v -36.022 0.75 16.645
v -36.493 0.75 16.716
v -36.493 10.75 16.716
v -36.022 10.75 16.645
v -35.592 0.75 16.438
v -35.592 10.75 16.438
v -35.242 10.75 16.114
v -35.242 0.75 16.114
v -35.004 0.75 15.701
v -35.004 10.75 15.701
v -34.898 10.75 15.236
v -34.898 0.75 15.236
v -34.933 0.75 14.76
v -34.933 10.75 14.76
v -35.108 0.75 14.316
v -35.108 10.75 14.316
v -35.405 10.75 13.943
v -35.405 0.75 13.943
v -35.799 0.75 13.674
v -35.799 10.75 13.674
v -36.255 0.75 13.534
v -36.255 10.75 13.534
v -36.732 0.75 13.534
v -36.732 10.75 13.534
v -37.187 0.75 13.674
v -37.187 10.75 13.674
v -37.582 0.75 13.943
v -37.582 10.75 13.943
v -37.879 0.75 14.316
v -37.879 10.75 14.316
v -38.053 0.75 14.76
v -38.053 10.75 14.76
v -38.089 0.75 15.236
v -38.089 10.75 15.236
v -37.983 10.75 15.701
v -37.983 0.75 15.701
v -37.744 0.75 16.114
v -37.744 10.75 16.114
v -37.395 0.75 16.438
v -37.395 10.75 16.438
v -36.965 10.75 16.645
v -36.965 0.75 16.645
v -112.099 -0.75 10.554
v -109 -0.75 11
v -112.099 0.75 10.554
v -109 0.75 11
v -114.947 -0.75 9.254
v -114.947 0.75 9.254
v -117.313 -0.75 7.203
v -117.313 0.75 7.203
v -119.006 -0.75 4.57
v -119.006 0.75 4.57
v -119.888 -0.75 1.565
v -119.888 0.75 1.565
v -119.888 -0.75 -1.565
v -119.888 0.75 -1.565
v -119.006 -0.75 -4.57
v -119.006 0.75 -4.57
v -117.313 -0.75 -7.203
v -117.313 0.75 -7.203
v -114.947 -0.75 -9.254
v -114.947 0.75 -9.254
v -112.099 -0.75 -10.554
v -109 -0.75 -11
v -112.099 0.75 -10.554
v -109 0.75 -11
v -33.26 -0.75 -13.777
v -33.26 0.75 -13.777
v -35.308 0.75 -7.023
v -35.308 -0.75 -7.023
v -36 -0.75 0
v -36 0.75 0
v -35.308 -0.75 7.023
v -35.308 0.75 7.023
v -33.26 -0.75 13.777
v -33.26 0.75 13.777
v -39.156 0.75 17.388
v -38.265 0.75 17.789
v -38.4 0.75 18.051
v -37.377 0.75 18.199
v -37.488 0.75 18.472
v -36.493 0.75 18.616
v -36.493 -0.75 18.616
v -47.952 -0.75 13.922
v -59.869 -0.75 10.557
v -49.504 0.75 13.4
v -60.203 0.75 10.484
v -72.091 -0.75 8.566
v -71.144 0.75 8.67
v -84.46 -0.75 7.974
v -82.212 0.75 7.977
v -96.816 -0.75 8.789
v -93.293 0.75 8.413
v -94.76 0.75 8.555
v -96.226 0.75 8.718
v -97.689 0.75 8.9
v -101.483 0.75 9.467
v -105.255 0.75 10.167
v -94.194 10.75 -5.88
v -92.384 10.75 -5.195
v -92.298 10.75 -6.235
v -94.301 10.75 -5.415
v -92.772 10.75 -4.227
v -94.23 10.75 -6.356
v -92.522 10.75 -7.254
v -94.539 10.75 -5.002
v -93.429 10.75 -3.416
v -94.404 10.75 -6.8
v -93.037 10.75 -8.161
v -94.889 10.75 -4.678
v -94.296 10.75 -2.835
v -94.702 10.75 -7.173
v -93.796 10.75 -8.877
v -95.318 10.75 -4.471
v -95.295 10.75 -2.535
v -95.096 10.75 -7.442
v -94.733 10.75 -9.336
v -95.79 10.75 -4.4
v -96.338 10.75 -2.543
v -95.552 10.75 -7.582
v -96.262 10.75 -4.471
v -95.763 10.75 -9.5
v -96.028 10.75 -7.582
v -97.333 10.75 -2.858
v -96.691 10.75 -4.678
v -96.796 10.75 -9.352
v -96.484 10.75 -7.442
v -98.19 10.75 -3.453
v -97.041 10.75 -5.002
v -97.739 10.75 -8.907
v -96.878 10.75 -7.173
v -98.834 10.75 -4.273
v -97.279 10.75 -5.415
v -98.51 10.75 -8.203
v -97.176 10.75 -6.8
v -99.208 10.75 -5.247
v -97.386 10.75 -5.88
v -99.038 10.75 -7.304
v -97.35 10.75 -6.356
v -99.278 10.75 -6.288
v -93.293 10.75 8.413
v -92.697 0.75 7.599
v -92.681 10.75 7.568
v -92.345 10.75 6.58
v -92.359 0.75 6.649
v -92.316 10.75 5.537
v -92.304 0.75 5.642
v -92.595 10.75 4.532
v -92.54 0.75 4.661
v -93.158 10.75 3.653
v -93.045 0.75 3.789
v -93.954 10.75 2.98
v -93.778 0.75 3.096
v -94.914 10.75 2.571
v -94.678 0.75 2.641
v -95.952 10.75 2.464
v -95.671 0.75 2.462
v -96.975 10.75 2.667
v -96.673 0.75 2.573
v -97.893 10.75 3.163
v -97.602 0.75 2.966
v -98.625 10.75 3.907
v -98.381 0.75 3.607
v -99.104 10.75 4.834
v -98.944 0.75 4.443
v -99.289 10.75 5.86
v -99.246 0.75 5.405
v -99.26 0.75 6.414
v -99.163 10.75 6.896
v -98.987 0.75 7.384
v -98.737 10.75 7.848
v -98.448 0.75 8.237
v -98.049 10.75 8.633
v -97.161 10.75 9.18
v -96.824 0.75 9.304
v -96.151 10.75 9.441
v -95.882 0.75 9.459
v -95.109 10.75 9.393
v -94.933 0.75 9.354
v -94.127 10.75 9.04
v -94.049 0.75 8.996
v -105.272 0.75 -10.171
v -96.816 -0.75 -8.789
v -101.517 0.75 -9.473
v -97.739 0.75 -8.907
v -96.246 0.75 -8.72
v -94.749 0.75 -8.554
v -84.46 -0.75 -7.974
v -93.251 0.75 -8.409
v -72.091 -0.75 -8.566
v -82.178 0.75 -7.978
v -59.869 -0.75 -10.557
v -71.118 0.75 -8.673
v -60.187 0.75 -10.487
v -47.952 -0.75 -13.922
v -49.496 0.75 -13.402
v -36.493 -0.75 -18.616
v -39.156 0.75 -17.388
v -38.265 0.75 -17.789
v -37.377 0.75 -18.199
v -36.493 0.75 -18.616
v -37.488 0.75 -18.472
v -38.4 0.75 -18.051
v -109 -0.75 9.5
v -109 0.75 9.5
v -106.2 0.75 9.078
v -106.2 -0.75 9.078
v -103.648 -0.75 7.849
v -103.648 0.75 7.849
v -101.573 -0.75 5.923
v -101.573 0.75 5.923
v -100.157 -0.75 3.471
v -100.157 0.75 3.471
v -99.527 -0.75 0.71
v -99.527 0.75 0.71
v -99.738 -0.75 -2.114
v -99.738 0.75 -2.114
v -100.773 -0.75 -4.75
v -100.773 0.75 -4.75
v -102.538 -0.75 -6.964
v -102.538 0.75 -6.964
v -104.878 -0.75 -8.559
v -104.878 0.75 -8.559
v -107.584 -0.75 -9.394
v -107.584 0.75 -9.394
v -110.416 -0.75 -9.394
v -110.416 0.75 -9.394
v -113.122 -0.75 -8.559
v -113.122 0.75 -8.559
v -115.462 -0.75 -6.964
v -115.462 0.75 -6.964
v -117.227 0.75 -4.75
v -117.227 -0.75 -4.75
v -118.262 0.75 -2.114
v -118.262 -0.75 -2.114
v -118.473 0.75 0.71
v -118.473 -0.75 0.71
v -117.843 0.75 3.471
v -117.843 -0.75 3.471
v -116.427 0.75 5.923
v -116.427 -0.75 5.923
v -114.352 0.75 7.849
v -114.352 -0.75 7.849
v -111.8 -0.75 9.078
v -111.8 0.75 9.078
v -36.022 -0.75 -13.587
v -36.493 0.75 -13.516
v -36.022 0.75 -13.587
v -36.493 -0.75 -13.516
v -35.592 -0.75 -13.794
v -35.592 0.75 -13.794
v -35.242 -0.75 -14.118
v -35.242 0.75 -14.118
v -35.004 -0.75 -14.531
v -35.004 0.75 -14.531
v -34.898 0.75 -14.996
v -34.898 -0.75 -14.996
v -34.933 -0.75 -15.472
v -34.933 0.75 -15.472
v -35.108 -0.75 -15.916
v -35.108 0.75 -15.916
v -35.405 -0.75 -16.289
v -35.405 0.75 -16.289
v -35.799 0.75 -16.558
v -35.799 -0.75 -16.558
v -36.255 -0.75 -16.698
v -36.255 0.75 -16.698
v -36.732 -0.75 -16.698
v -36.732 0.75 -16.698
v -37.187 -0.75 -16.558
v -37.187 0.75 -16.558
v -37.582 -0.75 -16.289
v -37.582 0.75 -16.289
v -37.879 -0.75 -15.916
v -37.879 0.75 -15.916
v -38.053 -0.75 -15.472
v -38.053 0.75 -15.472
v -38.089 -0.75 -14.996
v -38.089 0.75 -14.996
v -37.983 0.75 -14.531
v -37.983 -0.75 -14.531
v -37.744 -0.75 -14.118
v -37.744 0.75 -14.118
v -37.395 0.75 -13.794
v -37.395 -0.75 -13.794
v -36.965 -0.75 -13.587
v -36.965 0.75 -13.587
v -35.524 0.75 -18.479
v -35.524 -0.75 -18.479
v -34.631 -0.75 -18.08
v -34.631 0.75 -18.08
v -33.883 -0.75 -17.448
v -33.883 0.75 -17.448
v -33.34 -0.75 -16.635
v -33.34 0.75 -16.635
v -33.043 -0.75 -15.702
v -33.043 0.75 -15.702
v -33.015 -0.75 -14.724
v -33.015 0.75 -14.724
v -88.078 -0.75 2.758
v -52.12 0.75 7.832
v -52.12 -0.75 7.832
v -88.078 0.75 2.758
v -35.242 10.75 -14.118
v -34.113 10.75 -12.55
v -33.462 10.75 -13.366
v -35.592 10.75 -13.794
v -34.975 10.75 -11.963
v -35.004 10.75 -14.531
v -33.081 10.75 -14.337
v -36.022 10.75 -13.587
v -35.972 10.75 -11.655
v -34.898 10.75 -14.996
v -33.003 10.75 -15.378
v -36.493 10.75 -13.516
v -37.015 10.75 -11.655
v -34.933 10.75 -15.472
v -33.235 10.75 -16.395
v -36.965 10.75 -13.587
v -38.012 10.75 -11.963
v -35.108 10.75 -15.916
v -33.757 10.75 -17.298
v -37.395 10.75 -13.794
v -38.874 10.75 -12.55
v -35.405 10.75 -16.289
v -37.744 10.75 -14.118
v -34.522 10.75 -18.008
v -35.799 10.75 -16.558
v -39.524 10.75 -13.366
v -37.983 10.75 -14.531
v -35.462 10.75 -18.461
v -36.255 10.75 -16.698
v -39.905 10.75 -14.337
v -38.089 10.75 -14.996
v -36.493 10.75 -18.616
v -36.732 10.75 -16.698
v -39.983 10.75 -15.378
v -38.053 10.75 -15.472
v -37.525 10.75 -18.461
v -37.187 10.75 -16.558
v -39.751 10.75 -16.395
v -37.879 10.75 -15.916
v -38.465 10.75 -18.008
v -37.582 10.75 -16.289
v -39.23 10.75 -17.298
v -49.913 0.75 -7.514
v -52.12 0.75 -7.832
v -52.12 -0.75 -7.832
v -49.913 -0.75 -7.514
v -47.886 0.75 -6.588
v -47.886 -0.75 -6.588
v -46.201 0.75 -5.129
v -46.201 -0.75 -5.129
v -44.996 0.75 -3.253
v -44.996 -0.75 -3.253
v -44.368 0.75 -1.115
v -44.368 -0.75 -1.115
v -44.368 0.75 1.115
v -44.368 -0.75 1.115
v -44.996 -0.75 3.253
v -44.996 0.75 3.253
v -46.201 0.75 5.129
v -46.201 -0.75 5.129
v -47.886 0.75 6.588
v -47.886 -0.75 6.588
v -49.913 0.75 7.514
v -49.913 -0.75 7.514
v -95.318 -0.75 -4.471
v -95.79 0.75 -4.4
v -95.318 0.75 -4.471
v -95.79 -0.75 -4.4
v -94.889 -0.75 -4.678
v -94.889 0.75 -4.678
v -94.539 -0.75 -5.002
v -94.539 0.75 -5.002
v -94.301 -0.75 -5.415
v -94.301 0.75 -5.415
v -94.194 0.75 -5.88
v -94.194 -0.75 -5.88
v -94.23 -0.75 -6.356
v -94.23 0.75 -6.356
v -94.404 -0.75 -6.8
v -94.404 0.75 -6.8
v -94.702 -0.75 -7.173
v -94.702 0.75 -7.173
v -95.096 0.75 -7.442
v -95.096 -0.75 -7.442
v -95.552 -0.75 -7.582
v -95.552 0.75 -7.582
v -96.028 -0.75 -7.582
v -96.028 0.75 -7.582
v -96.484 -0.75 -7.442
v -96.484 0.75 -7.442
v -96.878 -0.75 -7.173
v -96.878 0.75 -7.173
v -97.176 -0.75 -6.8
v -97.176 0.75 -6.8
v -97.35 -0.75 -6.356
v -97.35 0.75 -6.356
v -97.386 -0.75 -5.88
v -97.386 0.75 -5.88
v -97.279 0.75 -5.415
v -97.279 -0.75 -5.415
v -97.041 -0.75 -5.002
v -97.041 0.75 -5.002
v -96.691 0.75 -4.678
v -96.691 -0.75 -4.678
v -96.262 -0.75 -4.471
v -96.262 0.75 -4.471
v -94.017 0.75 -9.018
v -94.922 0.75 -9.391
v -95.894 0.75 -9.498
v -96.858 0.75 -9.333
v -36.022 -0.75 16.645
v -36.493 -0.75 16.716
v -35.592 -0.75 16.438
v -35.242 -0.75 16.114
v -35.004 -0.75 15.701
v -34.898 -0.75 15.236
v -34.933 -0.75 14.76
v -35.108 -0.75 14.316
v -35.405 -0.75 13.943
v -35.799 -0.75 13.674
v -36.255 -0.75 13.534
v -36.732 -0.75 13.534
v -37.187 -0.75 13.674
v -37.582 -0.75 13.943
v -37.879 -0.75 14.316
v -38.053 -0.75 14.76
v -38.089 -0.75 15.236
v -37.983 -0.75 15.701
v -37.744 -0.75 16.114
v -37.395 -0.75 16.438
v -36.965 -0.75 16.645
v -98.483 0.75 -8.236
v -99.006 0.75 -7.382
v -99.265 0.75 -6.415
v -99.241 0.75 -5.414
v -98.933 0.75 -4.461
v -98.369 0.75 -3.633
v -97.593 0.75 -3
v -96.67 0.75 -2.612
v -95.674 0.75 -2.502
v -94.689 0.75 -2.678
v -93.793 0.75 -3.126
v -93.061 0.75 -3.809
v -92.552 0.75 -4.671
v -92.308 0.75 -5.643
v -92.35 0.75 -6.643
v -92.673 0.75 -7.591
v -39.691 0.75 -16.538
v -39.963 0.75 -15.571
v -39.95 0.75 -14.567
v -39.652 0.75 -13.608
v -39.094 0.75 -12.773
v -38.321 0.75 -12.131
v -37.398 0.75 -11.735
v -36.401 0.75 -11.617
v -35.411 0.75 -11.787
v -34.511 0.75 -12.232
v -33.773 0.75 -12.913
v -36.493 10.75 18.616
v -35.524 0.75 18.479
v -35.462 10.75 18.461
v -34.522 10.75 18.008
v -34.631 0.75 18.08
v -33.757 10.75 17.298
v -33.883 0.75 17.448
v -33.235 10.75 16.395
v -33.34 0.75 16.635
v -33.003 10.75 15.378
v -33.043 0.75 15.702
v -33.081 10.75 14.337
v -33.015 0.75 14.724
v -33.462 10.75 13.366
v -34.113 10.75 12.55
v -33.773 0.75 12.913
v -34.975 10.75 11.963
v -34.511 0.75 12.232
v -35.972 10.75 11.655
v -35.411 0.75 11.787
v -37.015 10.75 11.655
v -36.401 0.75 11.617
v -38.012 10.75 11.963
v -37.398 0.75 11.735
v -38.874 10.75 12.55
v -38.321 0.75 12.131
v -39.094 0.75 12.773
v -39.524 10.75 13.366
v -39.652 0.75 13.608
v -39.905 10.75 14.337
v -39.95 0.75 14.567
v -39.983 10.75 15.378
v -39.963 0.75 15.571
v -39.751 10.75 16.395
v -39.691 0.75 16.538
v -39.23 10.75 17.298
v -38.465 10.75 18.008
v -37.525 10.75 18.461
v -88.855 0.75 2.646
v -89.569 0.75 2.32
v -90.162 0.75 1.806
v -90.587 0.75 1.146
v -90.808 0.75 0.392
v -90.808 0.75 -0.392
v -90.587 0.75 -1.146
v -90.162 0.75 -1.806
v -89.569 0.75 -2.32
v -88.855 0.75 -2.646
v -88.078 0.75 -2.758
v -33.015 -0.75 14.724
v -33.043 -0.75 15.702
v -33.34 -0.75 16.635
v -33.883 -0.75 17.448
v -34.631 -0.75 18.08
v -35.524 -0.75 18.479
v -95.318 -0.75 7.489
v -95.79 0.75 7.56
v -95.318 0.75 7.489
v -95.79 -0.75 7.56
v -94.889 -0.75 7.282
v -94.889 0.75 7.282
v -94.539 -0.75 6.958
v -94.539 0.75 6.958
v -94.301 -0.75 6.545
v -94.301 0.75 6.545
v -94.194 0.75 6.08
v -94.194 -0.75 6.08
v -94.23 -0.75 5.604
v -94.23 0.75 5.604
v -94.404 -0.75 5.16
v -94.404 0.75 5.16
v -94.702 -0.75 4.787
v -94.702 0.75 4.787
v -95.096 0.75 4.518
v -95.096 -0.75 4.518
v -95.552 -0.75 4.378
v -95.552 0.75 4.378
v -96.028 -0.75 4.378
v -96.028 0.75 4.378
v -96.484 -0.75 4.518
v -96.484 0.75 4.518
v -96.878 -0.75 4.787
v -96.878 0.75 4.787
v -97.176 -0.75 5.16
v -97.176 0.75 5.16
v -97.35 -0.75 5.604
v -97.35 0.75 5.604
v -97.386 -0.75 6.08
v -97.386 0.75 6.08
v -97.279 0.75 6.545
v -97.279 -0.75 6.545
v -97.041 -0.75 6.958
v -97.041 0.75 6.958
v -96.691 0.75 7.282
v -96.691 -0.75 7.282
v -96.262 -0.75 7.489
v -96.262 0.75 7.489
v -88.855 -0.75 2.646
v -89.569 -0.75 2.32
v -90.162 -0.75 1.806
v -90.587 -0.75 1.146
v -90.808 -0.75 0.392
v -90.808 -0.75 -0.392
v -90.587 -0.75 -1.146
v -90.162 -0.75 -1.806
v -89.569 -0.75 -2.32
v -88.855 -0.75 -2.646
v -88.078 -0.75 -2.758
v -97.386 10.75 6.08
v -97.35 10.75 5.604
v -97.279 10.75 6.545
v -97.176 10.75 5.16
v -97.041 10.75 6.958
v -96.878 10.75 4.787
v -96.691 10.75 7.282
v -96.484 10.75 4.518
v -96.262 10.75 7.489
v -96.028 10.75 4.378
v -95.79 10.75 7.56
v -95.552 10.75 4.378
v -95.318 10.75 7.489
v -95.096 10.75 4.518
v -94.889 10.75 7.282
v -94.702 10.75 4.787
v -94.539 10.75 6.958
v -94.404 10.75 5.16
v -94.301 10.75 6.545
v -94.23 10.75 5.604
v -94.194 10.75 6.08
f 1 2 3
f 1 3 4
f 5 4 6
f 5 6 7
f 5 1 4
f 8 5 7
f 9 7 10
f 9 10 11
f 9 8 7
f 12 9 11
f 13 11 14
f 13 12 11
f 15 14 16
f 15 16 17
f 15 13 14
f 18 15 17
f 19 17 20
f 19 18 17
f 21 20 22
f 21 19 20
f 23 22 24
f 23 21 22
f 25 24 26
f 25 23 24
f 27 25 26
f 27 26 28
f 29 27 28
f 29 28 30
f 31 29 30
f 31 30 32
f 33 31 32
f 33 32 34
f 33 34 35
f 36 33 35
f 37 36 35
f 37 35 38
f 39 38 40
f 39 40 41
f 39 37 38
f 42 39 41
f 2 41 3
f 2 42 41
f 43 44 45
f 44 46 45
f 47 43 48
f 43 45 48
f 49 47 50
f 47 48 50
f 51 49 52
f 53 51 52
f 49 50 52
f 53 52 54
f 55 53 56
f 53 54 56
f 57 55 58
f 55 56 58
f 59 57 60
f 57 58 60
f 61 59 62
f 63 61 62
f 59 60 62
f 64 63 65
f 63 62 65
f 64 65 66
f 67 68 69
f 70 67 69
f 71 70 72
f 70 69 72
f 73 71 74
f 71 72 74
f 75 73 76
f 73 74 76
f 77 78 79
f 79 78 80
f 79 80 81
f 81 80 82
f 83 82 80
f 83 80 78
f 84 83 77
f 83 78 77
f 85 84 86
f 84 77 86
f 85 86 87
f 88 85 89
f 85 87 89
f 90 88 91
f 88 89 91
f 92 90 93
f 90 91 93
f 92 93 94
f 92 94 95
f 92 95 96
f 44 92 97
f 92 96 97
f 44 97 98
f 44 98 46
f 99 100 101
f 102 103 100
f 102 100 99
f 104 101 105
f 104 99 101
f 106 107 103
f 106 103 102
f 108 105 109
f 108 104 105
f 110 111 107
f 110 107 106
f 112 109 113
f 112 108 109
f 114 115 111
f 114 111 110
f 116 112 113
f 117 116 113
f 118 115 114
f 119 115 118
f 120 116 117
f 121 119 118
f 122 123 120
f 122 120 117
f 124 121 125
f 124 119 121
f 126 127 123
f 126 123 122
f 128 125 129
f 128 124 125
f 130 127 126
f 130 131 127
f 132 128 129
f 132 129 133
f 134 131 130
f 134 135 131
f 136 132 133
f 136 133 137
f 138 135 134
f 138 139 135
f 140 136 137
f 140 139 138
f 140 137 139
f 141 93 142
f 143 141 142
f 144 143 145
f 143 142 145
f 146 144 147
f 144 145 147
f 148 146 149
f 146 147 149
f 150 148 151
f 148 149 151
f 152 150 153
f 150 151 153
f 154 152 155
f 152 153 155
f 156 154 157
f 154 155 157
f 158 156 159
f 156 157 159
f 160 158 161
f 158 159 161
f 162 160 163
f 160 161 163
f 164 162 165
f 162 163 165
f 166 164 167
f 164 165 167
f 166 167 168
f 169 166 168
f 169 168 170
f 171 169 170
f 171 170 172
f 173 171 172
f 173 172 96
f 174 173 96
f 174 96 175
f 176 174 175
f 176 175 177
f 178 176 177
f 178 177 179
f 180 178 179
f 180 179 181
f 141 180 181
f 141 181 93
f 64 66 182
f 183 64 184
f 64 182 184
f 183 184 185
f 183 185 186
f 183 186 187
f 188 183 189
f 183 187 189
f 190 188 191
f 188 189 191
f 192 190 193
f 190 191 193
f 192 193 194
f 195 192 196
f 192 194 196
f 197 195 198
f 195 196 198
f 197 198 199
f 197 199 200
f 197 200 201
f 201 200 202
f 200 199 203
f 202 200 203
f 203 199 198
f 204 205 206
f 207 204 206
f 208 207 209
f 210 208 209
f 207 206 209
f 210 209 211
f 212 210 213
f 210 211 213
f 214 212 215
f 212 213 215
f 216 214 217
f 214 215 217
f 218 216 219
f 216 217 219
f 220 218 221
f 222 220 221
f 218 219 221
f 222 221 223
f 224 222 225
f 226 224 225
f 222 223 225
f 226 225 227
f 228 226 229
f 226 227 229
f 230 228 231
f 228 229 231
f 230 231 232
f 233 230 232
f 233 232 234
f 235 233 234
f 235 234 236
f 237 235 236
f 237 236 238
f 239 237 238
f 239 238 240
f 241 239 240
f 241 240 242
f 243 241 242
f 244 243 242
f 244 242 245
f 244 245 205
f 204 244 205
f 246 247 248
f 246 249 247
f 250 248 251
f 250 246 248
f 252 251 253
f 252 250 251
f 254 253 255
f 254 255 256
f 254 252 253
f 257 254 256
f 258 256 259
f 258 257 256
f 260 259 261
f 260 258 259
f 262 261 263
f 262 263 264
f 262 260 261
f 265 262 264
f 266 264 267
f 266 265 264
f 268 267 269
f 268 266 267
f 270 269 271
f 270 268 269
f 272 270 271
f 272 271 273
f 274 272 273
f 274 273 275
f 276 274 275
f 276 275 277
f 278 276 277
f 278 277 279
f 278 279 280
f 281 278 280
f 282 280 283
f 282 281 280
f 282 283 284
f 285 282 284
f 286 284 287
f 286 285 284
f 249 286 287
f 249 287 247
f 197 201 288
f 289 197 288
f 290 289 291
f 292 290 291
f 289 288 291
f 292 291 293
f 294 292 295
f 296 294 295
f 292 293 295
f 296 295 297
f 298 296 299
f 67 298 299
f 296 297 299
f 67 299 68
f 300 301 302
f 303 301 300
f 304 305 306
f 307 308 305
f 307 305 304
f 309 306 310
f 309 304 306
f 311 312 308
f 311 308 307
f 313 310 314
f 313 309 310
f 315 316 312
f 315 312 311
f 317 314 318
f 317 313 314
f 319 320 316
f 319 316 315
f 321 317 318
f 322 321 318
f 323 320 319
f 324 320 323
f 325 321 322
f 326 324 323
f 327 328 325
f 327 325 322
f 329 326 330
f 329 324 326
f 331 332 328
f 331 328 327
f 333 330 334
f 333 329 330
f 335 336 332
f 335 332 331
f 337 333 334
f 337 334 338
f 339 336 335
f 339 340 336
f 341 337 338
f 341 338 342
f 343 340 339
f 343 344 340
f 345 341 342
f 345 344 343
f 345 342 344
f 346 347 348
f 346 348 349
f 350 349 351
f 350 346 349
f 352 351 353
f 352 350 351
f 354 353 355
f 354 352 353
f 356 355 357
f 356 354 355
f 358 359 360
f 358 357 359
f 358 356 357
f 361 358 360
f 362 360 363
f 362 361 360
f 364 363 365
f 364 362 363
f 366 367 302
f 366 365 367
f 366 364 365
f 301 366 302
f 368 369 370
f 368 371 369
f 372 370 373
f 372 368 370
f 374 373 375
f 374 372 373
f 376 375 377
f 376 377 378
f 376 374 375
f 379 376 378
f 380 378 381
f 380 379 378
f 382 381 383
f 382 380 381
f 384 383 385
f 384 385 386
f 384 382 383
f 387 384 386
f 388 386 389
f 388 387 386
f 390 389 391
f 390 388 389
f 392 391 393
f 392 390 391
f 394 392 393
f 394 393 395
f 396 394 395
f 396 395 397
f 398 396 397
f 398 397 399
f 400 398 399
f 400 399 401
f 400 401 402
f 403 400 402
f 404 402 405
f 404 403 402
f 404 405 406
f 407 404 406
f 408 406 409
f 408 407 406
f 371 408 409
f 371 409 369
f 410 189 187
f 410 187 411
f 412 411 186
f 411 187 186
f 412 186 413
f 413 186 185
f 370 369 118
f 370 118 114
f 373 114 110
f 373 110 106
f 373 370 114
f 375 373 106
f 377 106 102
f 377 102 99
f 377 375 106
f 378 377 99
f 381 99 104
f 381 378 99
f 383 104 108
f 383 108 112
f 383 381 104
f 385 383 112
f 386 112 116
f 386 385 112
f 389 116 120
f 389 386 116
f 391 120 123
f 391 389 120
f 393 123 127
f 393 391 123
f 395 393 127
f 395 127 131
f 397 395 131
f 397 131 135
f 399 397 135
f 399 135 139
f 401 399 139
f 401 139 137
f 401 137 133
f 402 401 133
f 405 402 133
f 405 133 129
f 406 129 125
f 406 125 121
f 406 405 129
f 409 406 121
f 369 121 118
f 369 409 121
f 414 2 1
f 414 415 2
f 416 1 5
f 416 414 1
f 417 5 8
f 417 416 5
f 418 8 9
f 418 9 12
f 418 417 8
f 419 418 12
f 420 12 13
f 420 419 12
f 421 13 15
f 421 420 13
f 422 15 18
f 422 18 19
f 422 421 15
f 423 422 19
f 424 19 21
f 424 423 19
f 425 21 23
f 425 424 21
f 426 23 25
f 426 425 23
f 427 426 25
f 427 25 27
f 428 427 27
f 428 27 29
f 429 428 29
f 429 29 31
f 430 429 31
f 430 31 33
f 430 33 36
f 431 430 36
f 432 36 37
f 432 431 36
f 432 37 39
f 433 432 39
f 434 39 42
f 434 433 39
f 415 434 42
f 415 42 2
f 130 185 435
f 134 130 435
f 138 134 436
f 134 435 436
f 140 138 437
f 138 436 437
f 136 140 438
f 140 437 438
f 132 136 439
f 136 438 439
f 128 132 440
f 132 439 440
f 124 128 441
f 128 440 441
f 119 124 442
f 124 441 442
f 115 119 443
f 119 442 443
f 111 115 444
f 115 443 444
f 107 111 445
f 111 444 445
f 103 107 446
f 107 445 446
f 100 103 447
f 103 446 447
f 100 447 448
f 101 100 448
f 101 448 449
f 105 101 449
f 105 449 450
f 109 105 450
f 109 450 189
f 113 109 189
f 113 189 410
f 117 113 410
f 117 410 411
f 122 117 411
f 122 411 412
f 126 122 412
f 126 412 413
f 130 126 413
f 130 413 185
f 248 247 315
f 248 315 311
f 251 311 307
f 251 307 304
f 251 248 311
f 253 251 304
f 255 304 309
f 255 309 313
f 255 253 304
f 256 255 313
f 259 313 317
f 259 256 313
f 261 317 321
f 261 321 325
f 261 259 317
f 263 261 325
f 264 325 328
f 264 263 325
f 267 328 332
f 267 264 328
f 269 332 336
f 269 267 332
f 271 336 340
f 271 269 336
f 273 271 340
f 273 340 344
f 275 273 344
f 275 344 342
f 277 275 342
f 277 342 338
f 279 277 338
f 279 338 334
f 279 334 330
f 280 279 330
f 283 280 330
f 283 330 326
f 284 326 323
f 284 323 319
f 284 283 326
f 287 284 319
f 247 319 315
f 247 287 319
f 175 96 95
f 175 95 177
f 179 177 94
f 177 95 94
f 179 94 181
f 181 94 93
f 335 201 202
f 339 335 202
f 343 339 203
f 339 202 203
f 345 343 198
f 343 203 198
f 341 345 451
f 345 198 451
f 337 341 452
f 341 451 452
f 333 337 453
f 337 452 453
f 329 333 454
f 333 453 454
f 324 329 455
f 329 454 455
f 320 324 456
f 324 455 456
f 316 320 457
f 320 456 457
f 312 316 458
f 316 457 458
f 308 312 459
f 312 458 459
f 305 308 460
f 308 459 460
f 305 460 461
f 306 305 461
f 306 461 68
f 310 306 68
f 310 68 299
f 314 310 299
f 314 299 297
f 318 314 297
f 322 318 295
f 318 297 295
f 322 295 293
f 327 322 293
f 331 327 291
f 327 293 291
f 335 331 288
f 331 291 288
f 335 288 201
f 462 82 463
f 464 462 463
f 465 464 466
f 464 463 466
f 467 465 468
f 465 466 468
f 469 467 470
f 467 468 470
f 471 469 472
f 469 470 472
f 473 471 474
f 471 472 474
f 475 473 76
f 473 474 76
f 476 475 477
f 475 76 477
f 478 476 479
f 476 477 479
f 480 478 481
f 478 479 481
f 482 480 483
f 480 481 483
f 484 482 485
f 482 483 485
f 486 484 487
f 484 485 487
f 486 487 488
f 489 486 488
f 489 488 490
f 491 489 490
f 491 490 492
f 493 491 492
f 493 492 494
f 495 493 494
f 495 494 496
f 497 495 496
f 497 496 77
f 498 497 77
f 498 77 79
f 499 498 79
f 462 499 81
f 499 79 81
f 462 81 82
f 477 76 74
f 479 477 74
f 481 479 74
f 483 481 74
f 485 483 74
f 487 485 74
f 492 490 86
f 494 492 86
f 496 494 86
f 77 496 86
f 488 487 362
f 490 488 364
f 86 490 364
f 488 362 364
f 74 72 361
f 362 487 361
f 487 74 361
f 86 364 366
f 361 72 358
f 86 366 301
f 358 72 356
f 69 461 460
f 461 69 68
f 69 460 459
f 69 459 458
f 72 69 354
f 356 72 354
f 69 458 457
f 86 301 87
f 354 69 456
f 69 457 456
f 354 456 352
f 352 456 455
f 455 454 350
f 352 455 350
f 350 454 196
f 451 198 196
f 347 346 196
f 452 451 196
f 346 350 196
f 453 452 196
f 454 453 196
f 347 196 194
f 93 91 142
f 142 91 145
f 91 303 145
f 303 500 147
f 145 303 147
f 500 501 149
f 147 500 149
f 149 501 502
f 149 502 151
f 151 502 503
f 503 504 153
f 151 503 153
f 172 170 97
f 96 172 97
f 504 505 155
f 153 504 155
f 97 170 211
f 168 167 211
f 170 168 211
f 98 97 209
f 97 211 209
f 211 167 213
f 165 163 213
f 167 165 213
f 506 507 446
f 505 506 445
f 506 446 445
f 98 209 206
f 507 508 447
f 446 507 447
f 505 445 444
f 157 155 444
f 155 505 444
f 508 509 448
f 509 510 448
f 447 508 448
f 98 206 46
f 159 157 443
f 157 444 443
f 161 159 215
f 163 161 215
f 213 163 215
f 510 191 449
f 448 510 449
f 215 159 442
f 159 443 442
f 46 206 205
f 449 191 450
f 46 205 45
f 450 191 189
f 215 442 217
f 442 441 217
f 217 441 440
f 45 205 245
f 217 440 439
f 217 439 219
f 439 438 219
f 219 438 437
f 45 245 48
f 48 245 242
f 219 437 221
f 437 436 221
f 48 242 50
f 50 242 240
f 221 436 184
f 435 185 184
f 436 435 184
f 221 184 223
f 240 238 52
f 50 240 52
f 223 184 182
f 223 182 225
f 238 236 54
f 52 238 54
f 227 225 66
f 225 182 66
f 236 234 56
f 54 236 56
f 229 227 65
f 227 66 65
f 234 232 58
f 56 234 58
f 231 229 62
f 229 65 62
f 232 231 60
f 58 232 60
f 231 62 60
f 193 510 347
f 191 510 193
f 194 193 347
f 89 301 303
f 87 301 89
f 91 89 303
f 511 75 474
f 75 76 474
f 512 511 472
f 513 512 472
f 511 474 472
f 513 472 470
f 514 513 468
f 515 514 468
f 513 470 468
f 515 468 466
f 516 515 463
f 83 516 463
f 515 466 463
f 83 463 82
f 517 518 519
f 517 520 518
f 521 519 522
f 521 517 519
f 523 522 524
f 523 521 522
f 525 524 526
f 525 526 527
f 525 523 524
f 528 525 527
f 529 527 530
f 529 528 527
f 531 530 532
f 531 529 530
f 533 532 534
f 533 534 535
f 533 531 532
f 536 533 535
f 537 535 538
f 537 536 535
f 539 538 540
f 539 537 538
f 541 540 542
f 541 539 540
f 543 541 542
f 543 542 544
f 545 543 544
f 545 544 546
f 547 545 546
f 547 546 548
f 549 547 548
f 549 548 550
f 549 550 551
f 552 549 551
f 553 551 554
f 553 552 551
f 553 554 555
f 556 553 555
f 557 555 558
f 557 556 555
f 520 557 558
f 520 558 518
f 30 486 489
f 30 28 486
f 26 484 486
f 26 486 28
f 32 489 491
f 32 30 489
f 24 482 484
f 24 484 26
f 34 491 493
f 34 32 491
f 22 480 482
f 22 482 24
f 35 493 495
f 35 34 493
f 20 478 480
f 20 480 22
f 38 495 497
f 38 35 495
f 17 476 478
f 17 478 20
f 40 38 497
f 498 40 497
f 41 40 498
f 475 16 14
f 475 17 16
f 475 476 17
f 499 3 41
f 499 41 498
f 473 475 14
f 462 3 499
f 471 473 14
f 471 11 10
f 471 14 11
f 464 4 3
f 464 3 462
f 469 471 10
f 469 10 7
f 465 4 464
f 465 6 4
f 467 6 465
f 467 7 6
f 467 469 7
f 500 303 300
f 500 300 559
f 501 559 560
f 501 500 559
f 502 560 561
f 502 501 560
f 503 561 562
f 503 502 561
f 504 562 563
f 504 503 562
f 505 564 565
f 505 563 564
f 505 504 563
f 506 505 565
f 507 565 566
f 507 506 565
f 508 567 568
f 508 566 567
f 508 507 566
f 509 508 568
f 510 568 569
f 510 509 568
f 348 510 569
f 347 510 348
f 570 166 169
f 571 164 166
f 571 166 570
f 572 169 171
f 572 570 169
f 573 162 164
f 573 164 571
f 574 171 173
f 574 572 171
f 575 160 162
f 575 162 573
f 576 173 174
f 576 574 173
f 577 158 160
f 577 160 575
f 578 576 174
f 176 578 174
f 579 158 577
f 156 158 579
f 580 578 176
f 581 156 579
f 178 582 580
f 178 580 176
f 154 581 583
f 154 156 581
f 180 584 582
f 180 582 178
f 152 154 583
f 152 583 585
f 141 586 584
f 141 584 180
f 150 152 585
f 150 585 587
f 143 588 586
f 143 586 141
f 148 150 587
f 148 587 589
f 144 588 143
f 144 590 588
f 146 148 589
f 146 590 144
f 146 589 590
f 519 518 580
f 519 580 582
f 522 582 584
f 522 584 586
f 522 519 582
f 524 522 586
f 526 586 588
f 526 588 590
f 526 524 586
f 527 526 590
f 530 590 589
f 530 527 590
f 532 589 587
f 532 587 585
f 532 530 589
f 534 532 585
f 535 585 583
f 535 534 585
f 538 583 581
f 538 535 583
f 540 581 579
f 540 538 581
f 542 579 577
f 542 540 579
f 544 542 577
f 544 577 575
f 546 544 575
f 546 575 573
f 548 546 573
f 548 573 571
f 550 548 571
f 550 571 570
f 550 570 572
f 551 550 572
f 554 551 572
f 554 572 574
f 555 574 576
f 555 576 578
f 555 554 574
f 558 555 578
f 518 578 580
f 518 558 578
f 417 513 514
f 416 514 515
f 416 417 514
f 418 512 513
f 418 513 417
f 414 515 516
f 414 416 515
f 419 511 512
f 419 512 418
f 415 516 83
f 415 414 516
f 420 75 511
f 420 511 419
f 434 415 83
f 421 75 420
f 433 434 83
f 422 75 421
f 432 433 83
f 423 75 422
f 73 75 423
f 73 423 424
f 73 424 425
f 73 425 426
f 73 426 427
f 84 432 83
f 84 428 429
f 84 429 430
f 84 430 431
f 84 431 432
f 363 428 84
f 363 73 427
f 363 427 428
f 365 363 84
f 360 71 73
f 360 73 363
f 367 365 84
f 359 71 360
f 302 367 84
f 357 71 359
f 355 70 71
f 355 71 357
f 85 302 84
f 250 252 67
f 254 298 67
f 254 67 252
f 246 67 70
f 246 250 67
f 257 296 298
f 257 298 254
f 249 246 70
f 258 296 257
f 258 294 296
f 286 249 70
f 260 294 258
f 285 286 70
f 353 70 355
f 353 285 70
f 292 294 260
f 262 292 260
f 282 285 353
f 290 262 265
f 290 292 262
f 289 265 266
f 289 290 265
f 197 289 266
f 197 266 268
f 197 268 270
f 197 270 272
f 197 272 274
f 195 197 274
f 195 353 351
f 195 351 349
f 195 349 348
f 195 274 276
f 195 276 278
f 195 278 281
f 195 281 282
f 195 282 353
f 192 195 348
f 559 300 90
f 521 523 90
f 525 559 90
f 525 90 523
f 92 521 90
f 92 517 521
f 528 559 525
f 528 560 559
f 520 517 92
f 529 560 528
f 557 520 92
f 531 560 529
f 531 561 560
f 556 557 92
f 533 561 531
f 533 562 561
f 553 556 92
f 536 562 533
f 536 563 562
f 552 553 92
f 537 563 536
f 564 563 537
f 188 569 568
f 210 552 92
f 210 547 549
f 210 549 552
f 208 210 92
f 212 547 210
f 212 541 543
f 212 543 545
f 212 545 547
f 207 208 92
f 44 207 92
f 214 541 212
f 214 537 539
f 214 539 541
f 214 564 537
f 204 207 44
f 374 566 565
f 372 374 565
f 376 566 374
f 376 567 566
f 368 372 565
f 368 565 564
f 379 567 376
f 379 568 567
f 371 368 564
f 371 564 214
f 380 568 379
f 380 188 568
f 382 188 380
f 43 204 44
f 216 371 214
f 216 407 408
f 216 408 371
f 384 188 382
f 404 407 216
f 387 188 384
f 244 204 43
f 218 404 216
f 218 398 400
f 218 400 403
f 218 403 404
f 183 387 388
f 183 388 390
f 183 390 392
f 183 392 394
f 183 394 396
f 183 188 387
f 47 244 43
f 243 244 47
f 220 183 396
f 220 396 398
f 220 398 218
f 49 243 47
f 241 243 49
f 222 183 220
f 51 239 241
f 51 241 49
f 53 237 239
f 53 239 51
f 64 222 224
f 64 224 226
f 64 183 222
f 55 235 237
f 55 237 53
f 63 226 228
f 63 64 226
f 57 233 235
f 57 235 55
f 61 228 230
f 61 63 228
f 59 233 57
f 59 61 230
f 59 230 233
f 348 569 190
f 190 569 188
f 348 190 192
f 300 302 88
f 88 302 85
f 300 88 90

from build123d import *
from build123d.topology import SkipClean

# Parameters (mm, degrees)
ESBO_O1_R                = 1.6
RESSALTO_EXTRUS_O1_DEPTH = 0.75
CORTE_EXTRUS_O1_REACH    = 123.445
ESBO_O2_R                = 9.5
ESBO_O3_R                = 3.5
ESBO_O3_R_2              = 1.6
RESSALTO_EXTRUS_O2_DEPTH = 10


with BuildPart() as part:
    # Esboço1 → Ressalto-extrusão1 (new, symmetric)
    with BuildSketch(Plane(origin=(0, 0, 0), x_dir=(1, 0, 0), z_dir=(0, 1, 0))):
        with BuildLine():
            ThreePointArc((-33.25966317, 13.776603565), (-36, 0), (-33.25966317, -13.776603565))
            ThreePointArc((-33.25966317, -13.776603565), (-33.583097891, -17.060491394), (-36.493241534, -18.615995578))
            ThreePointArc((-36.493241534, -18.615995578), (-72.090991916, -8.566197582), (-109, -11))
            ThreePointArc((-109, -11), (-120, 0), (-109, 11))
            ThreePointArc((-109, 11), (-72.090991916, 8.566197582), (-36.493241534, 18.615995578))
            ThreePointArc((-36.493241534, 18.615995578), (-33.583097891, 17.060491394), (-33.25966317, 13.776603565))
        make_face()
        with Locations(Location((-36.493241534, 15.115995578, 0), (0, 0, 270))):
            Circle(ESBO_O1_R, mode=Mode.SUBTRACT)
        with Locations(Location((-36.493241534, -15.115995578, 0), (0, 0, 270))):
            Circle(ESBO_O1_R, mode=Mode.SUBTRACT)
        with Locations(Location((-95.79, 6, 0), (0, 0, 270))):
            Circle(ESBO_O1_R, mode=Mode.SUBTRACT)
        with Locations(Location((-95.79, -5.96, 0), (0, 0, 270))):
            Circle(ESBO_O1_R, mode=Mode.SUBTRACT)
    extrude(amount=RESSALTO_EXTRUS_O1_DEPTH, both=True)

    # Esboço2 → Corte-extrusão1 (cut, up to next)
    with BuildSketch(Plane(origin=(0, 0.75, 0), x_dir=(1, 0, 0), z_dir=(0, 1, 0)), mode=Mode.PRIVATE) as corte_extrus_o1_sk1:
        with Locations(Location((-109, 0, 0), (0, 0, 270))):
            Circle(ESBO_O2_R)
    corte_extrus_o1_tool1 = extrude(corte_extrus_o1_sk1.sketch, amount=-CORTE_EXTRUS_O1_REACH, mode=Mode.PRIVATE) & part.part
    # Esboço2 → Corte-extrusão1 (cut, up to next)
    with BuildSketch(Plane(origin=(0, 0.75, 0), x_dir=(1, 0, 0), z_dir=(0, 1, 0)), mode=Mode.PRIVATE) as corte_extrus_o1_sk2:
        with BuildLine():
            Line((-88.078445949, 2.757577424), (-52.119636338, 7.831519885))
            ThreePointArc((-52.119636338, 7.831519885), (-44.288116453, 0), (-52.119636338, -7.831519885))
            Line((-52.119636338, -7.831519885), (-88.078445949, -2.757577424))
            ThreePointArc((-88.078445949, -2.757577424), (-90.836023373, 0), (-88.078445949, 2.757577424))
        make_face()
    corte_extrus_o1_tool2 = extrude(corte_extrus_o1_sk2.sketch, amount=-CORTE_EXTRUS_O1_REACH, mode=Mode.PRIVATE) & part.part
    add(corte_extrus_o1_tool1.solids().sort_by_distance((-109, 0.75, 0))[0], mode=Mode.SUBTRACT)
    add(corte_extrus_o1_tool2.solids().sort_by_distance((-64.134293, 0.75, 0))[0], mode=Mode.SUBTRACT)

    # Esboço3 → Ressalto-extrusão2 (add)
    # profile 1 of 4: a face of its own
    with SkipClean():  # the faces are left unmerged after this step: merging them gives an invalid solid
        with BuildSketch(Plane(origin=(0, 0.75, 0), x_dir=(1, 0, 0), z_dir=(0, 1, 0))):
            with Locations(Location((-36.493241534, 15.115995578, 0), (0, 0, 90))):
                Circle(ESBO_O3_R)
            with Locations(Location((-36.493241534, 15.115995578, 0), (0, 0, 270))):
                Circle(ESBO_O3_R_2, mode=Mode.SUBTRACT)
        # profile 2 of 4: a face of its own
        with BuildSketch(Plane(origin=(0, 0.75, 0), x_dir=(1, 0, 0), z_dir=(0, 1, 0))):
            with Locations(Location((-36.493241534, -15.115995578, 0), (0, 0, 270))):
                Circle(ESBO_O3_R)
            with Locations(Location((-36.493241534, -15.115995578, 0), (0, 0, 270))):
                Circle(ESBO_O3_R_2, mode=Mode.SUBTRACT)
        # profile 3 of 4: a face of its own
        with BuildSketch(Plane(origin=(0, 0.75, 0), x_dir=(1, 0, 0), z_dir=(0, 1, 0))):
            with Locations(Location((-95.79, -5.96, 0), (0, 0, 315.511564989))):
                Circle(ESBO_O3_R)
            with Locations(Location((-95.79, -5.96, 0), (0, 0, 270))):
                Circle(ESBO_O3_R_2, mode=Mode.SUBTRACT)
        # profile 4 of 4: a face of its own
        with BuildSketch(Plane(origin=(0, 0.75, 0), x_dir=(1, 0, 0), z_dir=(0, 1, 0))):
            with Locations(Location((-95.79, 6, 0), (0, 0, 123.846033528))):
                Circle(ESBO_O3_R)
            with Locations(Location((-95.79, 6, 0), (0, 0, 270))):
                Circle(ESBO_O3_R_2, mode=Mode.SUBTRACT)
        extrude(amount=RESSALTO_EXTRUS_O2_DEPTH)


solid = part.part
